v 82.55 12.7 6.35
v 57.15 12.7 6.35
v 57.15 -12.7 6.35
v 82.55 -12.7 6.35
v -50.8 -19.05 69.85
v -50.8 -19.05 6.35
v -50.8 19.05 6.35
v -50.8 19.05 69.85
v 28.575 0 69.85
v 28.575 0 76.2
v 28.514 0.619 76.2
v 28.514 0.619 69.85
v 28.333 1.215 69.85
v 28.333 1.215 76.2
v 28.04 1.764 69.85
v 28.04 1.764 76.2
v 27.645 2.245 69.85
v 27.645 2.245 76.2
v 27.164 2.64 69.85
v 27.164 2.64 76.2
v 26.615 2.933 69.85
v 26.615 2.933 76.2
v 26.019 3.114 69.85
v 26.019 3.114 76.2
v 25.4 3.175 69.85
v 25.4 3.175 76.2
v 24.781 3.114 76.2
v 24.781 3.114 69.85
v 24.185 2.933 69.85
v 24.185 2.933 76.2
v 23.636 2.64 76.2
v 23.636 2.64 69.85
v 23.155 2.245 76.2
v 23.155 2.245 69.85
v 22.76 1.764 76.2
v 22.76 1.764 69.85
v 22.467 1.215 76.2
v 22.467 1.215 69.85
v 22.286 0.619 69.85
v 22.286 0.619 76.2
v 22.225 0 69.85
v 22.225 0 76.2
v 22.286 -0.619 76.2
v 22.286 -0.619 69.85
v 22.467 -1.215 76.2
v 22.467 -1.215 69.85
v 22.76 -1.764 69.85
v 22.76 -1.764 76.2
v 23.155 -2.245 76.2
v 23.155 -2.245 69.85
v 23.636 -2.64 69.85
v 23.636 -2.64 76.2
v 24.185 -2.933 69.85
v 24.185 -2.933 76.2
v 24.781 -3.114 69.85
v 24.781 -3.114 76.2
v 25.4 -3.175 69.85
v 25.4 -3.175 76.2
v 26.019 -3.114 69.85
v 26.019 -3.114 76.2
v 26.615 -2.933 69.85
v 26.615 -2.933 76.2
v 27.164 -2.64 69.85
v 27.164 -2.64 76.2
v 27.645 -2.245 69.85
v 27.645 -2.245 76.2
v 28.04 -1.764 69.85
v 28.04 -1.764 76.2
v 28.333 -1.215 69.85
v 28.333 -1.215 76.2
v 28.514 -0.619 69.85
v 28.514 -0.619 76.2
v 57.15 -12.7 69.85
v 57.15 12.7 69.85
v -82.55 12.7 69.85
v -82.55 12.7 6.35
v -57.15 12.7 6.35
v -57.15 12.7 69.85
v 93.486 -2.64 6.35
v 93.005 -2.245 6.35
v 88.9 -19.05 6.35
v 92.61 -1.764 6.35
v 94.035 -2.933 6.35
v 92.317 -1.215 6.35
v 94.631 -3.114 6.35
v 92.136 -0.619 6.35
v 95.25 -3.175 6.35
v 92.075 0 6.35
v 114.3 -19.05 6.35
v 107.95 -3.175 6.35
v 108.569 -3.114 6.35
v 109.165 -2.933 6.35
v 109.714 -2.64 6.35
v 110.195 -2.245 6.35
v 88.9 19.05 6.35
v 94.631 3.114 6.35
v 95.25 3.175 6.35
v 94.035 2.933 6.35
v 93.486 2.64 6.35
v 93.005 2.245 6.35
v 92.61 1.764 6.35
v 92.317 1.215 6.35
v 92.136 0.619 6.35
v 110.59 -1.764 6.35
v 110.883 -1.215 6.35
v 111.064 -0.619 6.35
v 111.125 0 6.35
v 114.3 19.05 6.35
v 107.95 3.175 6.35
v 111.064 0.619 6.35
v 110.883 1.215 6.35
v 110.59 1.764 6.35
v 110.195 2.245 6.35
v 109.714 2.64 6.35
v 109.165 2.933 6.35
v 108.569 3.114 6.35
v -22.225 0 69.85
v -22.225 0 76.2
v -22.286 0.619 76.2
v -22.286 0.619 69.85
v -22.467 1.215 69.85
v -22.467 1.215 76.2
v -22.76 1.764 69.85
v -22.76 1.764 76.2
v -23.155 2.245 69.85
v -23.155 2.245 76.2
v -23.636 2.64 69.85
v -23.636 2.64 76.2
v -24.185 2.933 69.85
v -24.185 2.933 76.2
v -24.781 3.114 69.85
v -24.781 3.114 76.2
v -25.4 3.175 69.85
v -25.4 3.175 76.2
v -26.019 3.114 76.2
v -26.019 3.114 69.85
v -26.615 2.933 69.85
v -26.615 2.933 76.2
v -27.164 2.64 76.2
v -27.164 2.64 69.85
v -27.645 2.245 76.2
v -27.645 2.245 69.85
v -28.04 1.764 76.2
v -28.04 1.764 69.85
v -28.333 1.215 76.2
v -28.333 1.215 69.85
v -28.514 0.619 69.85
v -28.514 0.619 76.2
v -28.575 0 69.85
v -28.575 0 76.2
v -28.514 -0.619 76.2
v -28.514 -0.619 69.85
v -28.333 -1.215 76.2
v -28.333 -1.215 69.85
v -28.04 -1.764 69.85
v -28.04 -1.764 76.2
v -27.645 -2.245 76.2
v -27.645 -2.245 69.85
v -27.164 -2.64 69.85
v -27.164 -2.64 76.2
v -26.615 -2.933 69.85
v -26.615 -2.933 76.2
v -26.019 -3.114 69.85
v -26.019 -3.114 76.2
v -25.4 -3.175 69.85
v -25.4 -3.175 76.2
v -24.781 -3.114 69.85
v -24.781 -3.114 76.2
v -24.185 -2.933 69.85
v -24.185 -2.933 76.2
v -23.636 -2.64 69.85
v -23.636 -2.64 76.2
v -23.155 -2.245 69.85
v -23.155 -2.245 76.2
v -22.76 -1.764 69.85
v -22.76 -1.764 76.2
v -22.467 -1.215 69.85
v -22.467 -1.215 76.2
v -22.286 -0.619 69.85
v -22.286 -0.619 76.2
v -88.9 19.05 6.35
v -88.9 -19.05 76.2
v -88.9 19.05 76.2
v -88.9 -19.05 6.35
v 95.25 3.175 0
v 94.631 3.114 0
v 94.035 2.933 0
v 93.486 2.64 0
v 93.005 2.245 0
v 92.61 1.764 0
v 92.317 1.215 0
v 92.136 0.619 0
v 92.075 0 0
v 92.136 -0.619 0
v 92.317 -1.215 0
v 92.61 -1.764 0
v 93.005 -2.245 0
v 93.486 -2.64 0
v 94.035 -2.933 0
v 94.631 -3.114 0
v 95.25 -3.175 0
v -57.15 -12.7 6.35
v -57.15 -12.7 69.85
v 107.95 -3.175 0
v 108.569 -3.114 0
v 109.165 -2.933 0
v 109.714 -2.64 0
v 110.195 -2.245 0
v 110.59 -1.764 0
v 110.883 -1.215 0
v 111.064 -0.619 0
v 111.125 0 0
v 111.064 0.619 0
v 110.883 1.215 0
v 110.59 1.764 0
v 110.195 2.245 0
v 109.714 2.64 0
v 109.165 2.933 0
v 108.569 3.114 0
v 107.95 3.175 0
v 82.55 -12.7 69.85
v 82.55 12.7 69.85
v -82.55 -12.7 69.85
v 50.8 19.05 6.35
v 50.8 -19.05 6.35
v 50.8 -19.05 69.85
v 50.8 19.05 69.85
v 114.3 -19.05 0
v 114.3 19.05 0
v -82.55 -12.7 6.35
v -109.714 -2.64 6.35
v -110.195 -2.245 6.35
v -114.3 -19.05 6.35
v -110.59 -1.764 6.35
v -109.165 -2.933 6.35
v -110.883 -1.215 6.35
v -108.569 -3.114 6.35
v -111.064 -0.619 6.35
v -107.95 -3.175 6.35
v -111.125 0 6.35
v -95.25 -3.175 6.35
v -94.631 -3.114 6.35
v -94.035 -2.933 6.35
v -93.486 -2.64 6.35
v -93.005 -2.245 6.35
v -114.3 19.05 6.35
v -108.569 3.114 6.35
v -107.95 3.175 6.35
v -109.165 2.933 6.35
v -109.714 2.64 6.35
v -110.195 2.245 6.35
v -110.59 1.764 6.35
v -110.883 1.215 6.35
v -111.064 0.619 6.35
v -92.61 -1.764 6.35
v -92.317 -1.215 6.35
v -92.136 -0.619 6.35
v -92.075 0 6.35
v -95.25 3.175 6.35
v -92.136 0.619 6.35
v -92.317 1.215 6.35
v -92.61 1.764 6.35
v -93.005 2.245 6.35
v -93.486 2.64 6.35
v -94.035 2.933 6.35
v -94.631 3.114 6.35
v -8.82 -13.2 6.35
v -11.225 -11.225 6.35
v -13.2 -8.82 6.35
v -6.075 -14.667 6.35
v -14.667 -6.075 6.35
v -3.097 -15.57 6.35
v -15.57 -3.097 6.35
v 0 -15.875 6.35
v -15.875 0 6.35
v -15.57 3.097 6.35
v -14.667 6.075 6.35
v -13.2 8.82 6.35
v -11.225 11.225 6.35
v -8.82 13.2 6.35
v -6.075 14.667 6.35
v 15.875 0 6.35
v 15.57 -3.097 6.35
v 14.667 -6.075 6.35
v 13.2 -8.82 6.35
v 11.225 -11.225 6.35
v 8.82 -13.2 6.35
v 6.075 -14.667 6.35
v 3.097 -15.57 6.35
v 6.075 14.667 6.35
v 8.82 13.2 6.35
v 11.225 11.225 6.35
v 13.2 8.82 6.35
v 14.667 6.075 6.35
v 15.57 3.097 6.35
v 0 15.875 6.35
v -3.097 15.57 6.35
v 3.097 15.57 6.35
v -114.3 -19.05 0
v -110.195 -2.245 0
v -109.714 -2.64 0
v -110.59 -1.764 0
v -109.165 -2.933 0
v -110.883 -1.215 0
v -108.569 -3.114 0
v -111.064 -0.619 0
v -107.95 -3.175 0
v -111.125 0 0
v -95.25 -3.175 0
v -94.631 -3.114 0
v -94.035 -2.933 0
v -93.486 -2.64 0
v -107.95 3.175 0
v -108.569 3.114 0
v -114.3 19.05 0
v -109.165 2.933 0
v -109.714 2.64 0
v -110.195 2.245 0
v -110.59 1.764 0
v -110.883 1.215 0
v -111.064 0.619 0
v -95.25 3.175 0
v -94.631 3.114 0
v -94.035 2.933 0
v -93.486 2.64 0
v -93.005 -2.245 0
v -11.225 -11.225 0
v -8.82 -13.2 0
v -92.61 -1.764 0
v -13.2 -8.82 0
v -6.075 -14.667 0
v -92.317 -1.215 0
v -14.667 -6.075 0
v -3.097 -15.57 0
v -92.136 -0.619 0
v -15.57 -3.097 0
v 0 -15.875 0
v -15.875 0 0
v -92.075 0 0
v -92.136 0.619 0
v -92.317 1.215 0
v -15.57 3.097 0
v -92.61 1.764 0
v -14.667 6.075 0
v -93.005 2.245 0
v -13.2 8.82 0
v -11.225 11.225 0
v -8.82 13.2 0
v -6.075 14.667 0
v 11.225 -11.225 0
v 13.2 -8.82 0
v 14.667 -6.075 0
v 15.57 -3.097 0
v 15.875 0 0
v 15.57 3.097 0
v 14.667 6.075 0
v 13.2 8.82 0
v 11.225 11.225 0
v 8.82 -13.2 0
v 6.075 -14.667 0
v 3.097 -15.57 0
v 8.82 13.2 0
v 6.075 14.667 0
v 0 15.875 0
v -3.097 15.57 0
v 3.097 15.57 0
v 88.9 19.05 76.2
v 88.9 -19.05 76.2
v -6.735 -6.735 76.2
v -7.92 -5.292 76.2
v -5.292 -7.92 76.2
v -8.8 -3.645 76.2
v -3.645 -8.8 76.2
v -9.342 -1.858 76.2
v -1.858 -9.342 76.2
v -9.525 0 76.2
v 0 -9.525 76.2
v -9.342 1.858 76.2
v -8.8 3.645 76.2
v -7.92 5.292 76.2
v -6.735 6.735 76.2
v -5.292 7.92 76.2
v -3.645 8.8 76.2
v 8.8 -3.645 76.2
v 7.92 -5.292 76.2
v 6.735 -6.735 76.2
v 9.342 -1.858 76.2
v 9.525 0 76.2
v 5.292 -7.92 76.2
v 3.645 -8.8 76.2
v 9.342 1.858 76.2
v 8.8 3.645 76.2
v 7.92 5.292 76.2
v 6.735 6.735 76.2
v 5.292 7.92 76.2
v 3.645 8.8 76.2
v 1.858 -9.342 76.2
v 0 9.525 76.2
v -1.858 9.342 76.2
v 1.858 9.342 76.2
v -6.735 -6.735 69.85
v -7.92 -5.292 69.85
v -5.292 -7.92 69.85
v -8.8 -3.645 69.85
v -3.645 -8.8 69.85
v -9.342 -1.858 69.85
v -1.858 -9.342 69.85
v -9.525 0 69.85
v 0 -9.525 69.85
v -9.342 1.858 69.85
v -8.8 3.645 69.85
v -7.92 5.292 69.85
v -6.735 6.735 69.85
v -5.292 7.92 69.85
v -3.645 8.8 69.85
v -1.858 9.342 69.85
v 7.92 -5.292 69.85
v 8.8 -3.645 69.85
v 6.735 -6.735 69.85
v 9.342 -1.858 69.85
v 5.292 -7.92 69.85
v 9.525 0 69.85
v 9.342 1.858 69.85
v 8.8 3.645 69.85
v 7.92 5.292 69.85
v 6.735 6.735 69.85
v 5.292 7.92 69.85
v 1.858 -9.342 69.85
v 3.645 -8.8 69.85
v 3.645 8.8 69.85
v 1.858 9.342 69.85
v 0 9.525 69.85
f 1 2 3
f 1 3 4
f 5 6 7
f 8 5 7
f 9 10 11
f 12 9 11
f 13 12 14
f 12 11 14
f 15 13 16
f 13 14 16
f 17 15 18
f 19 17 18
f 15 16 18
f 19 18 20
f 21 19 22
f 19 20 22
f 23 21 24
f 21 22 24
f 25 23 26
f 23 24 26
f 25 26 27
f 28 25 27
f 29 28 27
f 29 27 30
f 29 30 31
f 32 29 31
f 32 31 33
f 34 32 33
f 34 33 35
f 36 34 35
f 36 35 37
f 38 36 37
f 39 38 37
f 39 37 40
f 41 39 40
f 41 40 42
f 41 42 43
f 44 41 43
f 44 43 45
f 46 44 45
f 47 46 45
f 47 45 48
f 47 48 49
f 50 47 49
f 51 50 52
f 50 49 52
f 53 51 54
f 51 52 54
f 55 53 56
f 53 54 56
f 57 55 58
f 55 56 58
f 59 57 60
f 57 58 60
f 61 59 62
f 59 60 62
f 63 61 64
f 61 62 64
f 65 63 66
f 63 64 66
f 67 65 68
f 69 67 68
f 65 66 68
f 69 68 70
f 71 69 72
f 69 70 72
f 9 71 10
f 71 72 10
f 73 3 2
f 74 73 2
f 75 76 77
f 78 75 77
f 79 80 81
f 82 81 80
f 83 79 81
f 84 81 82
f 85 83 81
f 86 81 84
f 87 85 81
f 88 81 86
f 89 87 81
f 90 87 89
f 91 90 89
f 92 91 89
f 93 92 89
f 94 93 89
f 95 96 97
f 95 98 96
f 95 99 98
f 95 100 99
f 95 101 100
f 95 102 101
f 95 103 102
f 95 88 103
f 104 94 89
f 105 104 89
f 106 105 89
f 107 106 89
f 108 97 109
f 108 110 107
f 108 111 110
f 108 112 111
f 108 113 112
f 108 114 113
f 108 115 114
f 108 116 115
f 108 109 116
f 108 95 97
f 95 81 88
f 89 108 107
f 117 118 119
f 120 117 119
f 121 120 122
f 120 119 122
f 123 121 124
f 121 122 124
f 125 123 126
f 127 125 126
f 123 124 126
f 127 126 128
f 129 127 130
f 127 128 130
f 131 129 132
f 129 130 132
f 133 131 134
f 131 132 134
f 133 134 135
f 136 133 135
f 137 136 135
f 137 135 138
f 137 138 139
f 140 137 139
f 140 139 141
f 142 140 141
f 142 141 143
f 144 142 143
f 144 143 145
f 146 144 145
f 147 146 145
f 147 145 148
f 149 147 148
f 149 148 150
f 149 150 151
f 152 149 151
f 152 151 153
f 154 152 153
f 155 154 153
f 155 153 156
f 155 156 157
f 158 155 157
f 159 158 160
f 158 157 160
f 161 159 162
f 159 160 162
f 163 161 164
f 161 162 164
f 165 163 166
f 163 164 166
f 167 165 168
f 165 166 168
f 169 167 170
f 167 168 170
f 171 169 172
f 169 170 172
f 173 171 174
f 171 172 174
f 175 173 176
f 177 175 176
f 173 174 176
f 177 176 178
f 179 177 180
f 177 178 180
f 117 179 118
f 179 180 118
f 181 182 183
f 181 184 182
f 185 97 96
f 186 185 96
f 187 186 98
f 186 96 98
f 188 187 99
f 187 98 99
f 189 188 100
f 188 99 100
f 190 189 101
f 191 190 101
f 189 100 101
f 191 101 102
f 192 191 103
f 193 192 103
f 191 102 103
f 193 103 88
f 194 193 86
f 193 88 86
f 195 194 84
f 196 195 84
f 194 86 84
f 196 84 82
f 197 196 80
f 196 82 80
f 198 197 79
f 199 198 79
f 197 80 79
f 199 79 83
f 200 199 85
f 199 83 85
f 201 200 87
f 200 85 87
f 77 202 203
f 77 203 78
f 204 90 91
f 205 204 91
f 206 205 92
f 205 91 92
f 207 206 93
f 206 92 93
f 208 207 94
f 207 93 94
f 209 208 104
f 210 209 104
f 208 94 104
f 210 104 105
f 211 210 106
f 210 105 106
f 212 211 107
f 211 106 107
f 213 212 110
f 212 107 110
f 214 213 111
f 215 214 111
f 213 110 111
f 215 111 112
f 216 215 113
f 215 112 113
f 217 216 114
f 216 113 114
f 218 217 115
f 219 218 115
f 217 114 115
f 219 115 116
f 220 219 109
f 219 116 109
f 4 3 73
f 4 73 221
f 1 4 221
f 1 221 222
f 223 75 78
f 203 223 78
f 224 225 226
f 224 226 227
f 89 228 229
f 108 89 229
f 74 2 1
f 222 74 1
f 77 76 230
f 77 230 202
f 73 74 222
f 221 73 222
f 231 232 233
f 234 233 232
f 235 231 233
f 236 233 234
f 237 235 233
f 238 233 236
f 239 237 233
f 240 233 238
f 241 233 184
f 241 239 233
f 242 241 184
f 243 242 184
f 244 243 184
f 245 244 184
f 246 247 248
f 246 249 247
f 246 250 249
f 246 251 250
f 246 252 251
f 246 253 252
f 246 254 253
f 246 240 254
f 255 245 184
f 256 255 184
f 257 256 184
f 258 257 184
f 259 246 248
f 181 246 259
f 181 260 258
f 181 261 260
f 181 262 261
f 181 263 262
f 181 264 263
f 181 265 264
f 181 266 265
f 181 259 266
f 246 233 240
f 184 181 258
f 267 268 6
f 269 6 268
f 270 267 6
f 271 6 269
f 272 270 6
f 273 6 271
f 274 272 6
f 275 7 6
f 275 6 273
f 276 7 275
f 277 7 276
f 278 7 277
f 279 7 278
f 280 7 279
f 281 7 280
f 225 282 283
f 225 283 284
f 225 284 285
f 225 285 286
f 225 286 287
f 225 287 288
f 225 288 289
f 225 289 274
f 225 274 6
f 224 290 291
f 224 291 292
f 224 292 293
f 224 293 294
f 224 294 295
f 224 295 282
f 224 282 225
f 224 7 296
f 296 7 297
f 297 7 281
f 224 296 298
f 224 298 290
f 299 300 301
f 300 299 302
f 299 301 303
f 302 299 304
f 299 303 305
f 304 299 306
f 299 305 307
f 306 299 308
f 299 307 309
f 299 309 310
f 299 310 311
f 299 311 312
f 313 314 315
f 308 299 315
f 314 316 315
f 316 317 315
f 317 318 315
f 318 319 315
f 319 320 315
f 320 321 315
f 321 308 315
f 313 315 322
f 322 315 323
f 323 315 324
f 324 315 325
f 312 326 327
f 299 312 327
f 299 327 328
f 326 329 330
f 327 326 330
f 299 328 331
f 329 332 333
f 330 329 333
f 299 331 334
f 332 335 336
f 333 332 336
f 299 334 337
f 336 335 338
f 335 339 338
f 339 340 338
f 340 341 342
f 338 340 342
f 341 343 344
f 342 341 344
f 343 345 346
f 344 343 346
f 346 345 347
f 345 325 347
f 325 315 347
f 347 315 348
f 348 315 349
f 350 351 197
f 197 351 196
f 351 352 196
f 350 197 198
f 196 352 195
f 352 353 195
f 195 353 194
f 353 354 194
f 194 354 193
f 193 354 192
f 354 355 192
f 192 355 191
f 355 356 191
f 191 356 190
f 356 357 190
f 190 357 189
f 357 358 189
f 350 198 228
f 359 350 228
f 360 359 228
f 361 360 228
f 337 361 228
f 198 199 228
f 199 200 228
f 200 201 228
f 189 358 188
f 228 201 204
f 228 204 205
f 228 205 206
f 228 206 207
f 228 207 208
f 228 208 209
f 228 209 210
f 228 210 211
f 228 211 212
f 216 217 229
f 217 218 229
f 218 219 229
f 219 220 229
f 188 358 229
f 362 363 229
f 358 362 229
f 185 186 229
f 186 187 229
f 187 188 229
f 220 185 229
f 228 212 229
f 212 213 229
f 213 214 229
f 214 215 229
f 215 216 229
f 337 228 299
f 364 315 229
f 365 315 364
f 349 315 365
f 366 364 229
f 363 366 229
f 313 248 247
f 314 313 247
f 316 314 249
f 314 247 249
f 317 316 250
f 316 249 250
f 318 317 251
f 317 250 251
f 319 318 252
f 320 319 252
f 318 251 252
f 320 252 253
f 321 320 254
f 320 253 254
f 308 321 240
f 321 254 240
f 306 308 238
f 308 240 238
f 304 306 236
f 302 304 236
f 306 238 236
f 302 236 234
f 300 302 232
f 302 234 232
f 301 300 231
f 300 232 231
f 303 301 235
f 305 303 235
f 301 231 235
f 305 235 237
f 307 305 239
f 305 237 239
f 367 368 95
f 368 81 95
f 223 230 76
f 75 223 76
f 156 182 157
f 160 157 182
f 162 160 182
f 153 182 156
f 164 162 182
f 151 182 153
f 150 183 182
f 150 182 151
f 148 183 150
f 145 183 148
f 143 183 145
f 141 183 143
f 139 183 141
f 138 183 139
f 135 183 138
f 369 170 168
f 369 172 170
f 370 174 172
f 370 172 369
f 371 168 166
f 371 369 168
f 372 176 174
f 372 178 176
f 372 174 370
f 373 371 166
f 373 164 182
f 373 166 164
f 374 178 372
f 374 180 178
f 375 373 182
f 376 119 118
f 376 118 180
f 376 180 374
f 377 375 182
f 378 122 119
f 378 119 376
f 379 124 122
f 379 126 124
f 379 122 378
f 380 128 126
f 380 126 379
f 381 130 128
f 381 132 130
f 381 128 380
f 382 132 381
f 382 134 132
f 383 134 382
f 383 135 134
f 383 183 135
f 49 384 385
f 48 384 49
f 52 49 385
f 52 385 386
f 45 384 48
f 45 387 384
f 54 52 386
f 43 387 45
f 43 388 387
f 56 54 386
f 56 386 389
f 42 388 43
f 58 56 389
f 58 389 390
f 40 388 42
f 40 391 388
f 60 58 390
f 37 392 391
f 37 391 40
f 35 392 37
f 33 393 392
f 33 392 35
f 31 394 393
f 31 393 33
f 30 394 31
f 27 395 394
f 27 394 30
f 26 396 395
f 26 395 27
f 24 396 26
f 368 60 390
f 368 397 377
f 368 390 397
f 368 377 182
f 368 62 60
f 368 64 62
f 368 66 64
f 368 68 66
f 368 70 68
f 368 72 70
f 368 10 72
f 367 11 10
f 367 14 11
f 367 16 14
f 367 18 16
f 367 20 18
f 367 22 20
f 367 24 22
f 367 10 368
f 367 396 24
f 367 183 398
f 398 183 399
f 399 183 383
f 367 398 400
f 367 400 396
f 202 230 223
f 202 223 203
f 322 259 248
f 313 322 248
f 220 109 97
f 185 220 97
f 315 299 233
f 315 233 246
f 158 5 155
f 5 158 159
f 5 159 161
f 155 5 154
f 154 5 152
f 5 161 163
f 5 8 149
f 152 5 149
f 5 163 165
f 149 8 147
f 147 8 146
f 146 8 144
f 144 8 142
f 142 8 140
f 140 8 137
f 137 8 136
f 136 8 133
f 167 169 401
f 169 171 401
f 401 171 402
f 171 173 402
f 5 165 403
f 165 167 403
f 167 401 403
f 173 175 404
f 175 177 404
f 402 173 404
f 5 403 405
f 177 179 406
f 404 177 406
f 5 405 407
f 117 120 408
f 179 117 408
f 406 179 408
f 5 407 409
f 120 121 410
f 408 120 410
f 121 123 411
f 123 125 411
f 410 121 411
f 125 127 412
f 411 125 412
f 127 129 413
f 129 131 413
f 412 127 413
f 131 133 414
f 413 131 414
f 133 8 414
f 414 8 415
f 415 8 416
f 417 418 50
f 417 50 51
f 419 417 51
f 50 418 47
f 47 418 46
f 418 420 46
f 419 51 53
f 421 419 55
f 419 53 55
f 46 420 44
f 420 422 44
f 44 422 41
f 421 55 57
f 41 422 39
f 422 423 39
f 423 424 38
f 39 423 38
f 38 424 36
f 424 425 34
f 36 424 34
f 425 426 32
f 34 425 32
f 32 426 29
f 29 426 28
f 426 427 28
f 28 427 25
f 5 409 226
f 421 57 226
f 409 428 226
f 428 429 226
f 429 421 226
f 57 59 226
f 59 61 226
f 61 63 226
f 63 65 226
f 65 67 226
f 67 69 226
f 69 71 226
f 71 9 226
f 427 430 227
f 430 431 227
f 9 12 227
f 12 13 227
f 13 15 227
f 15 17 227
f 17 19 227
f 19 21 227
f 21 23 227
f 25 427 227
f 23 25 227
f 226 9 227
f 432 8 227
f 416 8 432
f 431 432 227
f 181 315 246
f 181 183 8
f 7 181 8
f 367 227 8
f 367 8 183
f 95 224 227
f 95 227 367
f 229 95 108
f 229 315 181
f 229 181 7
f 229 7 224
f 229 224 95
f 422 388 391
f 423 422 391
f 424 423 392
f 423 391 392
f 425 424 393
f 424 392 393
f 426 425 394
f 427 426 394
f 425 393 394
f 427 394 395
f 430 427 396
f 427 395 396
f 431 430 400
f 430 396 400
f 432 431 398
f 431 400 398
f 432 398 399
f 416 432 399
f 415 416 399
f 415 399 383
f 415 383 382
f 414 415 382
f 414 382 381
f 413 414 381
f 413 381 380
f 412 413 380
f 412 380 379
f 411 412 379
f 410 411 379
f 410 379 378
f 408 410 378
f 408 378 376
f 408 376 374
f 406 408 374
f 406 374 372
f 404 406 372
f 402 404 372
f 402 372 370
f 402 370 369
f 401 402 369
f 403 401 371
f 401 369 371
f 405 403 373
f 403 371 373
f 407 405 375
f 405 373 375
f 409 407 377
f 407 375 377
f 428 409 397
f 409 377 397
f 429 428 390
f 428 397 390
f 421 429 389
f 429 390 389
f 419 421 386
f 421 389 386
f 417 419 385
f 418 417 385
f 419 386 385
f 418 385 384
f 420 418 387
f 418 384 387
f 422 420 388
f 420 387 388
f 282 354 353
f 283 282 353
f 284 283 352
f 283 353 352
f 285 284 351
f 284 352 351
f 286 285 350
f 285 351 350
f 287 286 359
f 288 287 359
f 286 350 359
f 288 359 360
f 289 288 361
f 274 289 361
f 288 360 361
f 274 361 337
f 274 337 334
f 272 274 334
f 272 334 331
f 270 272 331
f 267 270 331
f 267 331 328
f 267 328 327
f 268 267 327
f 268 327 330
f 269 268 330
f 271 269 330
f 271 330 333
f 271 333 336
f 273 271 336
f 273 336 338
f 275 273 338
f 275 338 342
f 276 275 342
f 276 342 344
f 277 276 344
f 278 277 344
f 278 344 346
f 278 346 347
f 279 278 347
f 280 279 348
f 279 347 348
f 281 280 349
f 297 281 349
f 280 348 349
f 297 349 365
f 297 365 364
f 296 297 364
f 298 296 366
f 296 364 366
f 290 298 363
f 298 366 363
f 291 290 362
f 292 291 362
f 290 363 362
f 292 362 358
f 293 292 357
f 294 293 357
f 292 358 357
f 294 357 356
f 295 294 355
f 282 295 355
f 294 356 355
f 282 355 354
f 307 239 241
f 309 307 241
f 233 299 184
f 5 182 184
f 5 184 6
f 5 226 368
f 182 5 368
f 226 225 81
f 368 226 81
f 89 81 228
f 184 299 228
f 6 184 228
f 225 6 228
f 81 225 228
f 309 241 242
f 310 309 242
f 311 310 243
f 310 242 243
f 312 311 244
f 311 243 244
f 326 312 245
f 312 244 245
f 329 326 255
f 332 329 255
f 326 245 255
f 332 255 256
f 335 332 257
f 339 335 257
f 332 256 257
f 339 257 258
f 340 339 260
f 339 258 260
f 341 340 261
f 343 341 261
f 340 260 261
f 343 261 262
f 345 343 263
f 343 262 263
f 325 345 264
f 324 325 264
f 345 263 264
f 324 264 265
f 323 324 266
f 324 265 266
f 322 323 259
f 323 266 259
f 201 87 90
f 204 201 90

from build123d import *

# Parameters (mm, degrees)
F0_W      = 228.6
F0_H      = 38.1
F9_DEPTH  = 6.35
F1_W      = 38.1
F1_H      = 38.1
F1_W_2    = 25.4
F1_H_2    = 25.4
F10_DEPTH = 63.5
F11_W     = 177.8
F11_H     = 38.1
F2_DEPTH  = 6.35
F3_R      = 9.525
F3_R_2    = 3.175
F4_DEPTH  = 25.4
F6_DEPTH  = 6.351
F7_R      = 15.875
F8_DEPTH  = 25.4


with BuildPart() as f9:
    # F0 (on Top) → F9 (new body)
    with BuildSketch(Plane.XY):
        Rectangle(F0_W, F0_H)
    extrude(amount=F9_DEPTH)

    # F1 (on face) → F10 (join)
    with BuildSketch(Plane.XY.offset(6.35)):
        with Locations((69.85, 0)):
            Rectangle(F1_W, F1_H)
        with Locations((69.85, 0)):
            Rectangle(F1_W_2, F1_H_2, mode=Mode.SUBTRACT)
        with Locations((-69.85, 0)):
            Rectangle(F1_W, F1_H)
        with Locations((-69.85, 0)):
            Rectangle(F1_W_2, F1_H_2, mode=Mode.SUBTRACT)
    extrude(amount=F10_DEPTH)

    # F11 (on face) → F2 (join)
    with BuildSketch(Plane.XY.offset(69.85)):
        Rectangle(F11_W, F11_H)
    extrude(amount=F2_DEPTH)

    # F3 (on face) → F4 (cut)
    with BuildSketch(Plane.XY.offset(76.2)):
        Circle(F3_R)
        with Locations((25.4, 0)):
            Circle(F3_R_2)
        with Locations((-25.4, 0)):
            Circle(F3_R_2)
    extrude(amount=-F4_DEPTH, mode=Mode.SUBTRACT)

    # F5 (on face) → F6 (cut, through all)
    with BuildSketch(Plane.XY.offset(6.35)):
        with BuildLine():
            Line((-95.25, 3.175), (-107.95, 3.175))
            ThreePointArc((-107.95, 3.175), (-111.125, 0), (-107.95, -3.175))
            Line((-107.95, -3.175), (-95.25, -3.175))
            ThreePointArc((-95.25, -3.175), (-92.075, 0), (-95.25, 3.175))
        make_face()
        with BuildLine():
            Line((95.25, -3.175), (107.95, -3.175))
            ThreePointArc((107.95, -3.175), (111.125, 0), (107.95, 3.175))
            Line((107.95, 3.175), (95.25, 3.175))
            ThreePointArc((95.25, 3.175), (92.075, 0), (95.25, -3.175))
        make_face()
    extrude(amount=-F6_DEPTH, mode=Mode.SUBTRACT)

    # F7 (on face) → F8 (cut)
    with BuildSketch(Plane(origin=(0, 0, 0), x_dir=(1, 0, 0), z_dir=(0, 0, -1))):
        Circle(F7_R)
    extrude(amount=-F8_DEPTH, mode=Mode.SUBTRACT)


solid = f9.part
